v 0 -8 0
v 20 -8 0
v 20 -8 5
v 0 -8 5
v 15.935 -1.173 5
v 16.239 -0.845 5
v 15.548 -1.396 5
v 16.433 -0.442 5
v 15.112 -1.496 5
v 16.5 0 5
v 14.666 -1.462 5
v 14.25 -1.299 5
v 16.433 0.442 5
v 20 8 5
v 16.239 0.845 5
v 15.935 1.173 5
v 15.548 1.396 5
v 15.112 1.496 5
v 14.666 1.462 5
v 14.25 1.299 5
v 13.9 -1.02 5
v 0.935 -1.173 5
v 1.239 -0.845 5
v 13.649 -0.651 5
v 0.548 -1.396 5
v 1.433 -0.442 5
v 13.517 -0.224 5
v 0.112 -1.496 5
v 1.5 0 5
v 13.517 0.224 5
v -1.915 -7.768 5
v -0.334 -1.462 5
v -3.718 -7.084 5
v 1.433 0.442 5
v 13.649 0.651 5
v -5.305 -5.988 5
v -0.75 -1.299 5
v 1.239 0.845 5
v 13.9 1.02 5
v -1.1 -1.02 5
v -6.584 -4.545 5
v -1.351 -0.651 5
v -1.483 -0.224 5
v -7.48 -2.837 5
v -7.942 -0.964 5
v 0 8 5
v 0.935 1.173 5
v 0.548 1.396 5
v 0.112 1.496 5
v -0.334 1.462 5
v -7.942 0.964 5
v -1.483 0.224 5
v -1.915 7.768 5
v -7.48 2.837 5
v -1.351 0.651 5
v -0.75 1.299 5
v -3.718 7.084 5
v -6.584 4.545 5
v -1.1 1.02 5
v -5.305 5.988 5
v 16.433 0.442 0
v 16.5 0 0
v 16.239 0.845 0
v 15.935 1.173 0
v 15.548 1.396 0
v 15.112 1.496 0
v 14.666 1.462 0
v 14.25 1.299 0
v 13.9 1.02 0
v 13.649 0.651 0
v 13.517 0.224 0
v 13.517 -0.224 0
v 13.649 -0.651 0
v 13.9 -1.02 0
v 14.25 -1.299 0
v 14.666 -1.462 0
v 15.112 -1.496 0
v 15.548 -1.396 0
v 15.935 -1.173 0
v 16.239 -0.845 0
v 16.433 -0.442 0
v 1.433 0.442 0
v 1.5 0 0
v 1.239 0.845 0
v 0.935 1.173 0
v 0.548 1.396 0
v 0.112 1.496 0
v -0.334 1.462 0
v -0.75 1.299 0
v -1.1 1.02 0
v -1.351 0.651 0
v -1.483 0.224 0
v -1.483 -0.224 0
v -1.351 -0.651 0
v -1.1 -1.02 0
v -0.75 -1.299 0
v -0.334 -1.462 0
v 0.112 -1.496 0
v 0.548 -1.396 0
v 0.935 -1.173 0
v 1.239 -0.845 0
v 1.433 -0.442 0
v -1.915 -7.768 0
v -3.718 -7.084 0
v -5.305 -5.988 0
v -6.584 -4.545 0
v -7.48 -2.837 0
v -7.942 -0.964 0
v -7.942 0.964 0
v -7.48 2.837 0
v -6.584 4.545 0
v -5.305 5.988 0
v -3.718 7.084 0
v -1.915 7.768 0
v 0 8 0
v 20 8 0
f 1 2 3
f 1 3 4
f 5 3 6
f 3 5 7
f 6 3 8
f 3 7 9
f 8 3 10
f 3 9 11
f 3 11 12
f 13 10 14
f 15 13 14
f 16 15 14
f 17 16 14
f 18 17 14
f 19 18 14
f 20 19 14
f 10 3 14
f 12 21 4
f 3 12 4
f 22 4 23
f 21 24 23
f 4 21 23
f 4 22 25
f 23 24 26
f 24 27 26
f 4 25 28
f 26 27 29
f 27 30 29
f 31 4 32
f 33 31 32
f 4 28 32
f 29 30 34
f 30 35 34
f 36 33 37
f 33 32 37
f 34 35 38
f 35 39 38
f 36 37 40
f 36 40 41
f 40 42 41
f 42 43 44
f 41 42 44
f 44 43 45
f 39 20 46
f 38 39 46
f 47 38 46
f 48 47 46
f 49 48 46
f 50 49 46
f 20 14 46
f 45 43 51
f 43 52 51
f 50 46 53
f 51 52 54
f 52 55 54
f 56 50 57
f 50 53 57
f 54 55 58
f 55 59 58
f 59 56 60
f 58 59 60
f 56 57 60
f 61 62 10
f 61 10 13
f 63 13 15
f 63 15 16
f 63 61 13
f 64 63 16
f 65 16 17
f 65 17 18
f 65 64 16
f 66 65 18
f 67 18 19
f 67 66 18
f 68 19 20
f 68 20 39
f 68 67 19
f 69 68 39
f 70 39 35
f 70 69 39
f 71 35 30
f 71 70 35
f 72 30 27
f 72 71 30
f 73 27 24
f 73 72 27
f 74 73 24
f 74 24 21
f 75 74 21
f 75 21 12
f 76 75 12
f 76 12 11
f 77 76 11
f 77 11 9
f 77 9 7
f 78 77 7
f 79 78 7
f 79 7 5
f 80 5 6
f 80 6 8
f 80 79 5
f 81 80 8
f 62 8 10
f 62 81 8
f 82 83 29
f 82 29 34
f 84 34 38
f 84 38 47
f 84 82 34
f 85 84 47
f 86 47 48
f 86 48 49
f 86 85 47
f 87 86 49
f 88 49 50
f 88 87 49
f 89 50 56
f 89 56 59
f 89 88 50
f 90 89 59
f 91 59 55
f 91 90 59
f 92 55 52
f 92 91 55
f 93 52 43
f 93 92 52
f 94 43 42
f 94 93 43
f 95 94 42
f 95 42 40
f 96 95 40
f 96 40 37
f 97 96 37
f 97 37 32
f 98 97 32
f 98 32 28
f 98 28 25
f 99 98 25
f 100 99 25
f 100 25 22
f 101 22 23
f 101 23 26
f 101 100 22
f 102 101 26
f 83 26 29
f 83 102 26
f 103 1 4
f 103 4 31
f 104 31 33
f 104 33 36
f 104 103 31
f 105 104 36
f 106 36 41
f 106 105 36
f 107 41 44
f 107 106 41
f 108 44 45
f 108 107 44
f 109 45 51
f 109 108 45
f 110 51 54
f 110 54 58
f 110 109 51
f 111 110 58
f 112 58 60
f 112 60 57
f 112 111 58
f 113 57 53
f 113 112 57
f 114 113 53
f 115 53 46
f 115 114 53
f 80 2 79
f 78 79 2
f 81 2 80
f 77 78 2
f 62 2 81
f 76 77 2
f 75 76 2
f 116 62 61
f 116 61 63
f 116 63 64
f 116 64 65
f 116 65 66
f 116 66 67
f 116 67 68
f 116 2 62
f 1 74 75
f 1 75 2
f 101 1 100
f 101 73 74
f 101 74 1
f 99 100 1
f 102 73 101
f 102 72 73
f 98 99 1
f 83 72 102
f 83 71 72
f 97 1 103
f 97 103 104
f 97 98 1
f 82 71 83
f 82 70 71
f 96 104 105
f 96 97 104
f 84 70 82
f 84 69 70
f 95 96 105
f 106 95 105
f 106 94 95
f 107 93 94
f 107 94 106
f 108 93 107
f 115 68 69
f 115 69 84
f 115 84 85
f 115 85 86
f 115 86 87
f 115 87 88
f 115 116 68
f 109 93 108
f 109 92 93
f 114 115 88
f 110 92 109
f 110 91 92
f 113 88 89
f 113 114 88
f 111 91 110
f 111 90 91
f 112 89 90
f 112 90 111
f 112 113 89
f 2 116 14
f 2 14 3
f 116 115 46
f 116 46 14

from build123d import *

# Parameters (mm, degrees)
ESQUISSE1_R        = 1.5
BOSS_EXTRU_1_DEPTH = 5


with BuildPart() as part:
    # Esquisse1 → Boss.-Extru.1 (new body)
    with BuildSketch(Plane.XY):
        with BuildLine():
            Line((0, 8), (20, 8))
            Line((20, 8), (20, -8))
            Line((20, -8), (0, -8))
            ThreePointArc((0, -8), (-8, 0), (0, 8))
        make_face()
        Circle(ESQUISSE1_R, mode=Mode.SUBTRACT)
        with Locations((15, 0)):
            Circle(ESQUISSE1_R, mode=Mode.SUBTRACT)
    extrude(amount=BOSS_EXTRU_1_DEPTH)


solid = part.part
